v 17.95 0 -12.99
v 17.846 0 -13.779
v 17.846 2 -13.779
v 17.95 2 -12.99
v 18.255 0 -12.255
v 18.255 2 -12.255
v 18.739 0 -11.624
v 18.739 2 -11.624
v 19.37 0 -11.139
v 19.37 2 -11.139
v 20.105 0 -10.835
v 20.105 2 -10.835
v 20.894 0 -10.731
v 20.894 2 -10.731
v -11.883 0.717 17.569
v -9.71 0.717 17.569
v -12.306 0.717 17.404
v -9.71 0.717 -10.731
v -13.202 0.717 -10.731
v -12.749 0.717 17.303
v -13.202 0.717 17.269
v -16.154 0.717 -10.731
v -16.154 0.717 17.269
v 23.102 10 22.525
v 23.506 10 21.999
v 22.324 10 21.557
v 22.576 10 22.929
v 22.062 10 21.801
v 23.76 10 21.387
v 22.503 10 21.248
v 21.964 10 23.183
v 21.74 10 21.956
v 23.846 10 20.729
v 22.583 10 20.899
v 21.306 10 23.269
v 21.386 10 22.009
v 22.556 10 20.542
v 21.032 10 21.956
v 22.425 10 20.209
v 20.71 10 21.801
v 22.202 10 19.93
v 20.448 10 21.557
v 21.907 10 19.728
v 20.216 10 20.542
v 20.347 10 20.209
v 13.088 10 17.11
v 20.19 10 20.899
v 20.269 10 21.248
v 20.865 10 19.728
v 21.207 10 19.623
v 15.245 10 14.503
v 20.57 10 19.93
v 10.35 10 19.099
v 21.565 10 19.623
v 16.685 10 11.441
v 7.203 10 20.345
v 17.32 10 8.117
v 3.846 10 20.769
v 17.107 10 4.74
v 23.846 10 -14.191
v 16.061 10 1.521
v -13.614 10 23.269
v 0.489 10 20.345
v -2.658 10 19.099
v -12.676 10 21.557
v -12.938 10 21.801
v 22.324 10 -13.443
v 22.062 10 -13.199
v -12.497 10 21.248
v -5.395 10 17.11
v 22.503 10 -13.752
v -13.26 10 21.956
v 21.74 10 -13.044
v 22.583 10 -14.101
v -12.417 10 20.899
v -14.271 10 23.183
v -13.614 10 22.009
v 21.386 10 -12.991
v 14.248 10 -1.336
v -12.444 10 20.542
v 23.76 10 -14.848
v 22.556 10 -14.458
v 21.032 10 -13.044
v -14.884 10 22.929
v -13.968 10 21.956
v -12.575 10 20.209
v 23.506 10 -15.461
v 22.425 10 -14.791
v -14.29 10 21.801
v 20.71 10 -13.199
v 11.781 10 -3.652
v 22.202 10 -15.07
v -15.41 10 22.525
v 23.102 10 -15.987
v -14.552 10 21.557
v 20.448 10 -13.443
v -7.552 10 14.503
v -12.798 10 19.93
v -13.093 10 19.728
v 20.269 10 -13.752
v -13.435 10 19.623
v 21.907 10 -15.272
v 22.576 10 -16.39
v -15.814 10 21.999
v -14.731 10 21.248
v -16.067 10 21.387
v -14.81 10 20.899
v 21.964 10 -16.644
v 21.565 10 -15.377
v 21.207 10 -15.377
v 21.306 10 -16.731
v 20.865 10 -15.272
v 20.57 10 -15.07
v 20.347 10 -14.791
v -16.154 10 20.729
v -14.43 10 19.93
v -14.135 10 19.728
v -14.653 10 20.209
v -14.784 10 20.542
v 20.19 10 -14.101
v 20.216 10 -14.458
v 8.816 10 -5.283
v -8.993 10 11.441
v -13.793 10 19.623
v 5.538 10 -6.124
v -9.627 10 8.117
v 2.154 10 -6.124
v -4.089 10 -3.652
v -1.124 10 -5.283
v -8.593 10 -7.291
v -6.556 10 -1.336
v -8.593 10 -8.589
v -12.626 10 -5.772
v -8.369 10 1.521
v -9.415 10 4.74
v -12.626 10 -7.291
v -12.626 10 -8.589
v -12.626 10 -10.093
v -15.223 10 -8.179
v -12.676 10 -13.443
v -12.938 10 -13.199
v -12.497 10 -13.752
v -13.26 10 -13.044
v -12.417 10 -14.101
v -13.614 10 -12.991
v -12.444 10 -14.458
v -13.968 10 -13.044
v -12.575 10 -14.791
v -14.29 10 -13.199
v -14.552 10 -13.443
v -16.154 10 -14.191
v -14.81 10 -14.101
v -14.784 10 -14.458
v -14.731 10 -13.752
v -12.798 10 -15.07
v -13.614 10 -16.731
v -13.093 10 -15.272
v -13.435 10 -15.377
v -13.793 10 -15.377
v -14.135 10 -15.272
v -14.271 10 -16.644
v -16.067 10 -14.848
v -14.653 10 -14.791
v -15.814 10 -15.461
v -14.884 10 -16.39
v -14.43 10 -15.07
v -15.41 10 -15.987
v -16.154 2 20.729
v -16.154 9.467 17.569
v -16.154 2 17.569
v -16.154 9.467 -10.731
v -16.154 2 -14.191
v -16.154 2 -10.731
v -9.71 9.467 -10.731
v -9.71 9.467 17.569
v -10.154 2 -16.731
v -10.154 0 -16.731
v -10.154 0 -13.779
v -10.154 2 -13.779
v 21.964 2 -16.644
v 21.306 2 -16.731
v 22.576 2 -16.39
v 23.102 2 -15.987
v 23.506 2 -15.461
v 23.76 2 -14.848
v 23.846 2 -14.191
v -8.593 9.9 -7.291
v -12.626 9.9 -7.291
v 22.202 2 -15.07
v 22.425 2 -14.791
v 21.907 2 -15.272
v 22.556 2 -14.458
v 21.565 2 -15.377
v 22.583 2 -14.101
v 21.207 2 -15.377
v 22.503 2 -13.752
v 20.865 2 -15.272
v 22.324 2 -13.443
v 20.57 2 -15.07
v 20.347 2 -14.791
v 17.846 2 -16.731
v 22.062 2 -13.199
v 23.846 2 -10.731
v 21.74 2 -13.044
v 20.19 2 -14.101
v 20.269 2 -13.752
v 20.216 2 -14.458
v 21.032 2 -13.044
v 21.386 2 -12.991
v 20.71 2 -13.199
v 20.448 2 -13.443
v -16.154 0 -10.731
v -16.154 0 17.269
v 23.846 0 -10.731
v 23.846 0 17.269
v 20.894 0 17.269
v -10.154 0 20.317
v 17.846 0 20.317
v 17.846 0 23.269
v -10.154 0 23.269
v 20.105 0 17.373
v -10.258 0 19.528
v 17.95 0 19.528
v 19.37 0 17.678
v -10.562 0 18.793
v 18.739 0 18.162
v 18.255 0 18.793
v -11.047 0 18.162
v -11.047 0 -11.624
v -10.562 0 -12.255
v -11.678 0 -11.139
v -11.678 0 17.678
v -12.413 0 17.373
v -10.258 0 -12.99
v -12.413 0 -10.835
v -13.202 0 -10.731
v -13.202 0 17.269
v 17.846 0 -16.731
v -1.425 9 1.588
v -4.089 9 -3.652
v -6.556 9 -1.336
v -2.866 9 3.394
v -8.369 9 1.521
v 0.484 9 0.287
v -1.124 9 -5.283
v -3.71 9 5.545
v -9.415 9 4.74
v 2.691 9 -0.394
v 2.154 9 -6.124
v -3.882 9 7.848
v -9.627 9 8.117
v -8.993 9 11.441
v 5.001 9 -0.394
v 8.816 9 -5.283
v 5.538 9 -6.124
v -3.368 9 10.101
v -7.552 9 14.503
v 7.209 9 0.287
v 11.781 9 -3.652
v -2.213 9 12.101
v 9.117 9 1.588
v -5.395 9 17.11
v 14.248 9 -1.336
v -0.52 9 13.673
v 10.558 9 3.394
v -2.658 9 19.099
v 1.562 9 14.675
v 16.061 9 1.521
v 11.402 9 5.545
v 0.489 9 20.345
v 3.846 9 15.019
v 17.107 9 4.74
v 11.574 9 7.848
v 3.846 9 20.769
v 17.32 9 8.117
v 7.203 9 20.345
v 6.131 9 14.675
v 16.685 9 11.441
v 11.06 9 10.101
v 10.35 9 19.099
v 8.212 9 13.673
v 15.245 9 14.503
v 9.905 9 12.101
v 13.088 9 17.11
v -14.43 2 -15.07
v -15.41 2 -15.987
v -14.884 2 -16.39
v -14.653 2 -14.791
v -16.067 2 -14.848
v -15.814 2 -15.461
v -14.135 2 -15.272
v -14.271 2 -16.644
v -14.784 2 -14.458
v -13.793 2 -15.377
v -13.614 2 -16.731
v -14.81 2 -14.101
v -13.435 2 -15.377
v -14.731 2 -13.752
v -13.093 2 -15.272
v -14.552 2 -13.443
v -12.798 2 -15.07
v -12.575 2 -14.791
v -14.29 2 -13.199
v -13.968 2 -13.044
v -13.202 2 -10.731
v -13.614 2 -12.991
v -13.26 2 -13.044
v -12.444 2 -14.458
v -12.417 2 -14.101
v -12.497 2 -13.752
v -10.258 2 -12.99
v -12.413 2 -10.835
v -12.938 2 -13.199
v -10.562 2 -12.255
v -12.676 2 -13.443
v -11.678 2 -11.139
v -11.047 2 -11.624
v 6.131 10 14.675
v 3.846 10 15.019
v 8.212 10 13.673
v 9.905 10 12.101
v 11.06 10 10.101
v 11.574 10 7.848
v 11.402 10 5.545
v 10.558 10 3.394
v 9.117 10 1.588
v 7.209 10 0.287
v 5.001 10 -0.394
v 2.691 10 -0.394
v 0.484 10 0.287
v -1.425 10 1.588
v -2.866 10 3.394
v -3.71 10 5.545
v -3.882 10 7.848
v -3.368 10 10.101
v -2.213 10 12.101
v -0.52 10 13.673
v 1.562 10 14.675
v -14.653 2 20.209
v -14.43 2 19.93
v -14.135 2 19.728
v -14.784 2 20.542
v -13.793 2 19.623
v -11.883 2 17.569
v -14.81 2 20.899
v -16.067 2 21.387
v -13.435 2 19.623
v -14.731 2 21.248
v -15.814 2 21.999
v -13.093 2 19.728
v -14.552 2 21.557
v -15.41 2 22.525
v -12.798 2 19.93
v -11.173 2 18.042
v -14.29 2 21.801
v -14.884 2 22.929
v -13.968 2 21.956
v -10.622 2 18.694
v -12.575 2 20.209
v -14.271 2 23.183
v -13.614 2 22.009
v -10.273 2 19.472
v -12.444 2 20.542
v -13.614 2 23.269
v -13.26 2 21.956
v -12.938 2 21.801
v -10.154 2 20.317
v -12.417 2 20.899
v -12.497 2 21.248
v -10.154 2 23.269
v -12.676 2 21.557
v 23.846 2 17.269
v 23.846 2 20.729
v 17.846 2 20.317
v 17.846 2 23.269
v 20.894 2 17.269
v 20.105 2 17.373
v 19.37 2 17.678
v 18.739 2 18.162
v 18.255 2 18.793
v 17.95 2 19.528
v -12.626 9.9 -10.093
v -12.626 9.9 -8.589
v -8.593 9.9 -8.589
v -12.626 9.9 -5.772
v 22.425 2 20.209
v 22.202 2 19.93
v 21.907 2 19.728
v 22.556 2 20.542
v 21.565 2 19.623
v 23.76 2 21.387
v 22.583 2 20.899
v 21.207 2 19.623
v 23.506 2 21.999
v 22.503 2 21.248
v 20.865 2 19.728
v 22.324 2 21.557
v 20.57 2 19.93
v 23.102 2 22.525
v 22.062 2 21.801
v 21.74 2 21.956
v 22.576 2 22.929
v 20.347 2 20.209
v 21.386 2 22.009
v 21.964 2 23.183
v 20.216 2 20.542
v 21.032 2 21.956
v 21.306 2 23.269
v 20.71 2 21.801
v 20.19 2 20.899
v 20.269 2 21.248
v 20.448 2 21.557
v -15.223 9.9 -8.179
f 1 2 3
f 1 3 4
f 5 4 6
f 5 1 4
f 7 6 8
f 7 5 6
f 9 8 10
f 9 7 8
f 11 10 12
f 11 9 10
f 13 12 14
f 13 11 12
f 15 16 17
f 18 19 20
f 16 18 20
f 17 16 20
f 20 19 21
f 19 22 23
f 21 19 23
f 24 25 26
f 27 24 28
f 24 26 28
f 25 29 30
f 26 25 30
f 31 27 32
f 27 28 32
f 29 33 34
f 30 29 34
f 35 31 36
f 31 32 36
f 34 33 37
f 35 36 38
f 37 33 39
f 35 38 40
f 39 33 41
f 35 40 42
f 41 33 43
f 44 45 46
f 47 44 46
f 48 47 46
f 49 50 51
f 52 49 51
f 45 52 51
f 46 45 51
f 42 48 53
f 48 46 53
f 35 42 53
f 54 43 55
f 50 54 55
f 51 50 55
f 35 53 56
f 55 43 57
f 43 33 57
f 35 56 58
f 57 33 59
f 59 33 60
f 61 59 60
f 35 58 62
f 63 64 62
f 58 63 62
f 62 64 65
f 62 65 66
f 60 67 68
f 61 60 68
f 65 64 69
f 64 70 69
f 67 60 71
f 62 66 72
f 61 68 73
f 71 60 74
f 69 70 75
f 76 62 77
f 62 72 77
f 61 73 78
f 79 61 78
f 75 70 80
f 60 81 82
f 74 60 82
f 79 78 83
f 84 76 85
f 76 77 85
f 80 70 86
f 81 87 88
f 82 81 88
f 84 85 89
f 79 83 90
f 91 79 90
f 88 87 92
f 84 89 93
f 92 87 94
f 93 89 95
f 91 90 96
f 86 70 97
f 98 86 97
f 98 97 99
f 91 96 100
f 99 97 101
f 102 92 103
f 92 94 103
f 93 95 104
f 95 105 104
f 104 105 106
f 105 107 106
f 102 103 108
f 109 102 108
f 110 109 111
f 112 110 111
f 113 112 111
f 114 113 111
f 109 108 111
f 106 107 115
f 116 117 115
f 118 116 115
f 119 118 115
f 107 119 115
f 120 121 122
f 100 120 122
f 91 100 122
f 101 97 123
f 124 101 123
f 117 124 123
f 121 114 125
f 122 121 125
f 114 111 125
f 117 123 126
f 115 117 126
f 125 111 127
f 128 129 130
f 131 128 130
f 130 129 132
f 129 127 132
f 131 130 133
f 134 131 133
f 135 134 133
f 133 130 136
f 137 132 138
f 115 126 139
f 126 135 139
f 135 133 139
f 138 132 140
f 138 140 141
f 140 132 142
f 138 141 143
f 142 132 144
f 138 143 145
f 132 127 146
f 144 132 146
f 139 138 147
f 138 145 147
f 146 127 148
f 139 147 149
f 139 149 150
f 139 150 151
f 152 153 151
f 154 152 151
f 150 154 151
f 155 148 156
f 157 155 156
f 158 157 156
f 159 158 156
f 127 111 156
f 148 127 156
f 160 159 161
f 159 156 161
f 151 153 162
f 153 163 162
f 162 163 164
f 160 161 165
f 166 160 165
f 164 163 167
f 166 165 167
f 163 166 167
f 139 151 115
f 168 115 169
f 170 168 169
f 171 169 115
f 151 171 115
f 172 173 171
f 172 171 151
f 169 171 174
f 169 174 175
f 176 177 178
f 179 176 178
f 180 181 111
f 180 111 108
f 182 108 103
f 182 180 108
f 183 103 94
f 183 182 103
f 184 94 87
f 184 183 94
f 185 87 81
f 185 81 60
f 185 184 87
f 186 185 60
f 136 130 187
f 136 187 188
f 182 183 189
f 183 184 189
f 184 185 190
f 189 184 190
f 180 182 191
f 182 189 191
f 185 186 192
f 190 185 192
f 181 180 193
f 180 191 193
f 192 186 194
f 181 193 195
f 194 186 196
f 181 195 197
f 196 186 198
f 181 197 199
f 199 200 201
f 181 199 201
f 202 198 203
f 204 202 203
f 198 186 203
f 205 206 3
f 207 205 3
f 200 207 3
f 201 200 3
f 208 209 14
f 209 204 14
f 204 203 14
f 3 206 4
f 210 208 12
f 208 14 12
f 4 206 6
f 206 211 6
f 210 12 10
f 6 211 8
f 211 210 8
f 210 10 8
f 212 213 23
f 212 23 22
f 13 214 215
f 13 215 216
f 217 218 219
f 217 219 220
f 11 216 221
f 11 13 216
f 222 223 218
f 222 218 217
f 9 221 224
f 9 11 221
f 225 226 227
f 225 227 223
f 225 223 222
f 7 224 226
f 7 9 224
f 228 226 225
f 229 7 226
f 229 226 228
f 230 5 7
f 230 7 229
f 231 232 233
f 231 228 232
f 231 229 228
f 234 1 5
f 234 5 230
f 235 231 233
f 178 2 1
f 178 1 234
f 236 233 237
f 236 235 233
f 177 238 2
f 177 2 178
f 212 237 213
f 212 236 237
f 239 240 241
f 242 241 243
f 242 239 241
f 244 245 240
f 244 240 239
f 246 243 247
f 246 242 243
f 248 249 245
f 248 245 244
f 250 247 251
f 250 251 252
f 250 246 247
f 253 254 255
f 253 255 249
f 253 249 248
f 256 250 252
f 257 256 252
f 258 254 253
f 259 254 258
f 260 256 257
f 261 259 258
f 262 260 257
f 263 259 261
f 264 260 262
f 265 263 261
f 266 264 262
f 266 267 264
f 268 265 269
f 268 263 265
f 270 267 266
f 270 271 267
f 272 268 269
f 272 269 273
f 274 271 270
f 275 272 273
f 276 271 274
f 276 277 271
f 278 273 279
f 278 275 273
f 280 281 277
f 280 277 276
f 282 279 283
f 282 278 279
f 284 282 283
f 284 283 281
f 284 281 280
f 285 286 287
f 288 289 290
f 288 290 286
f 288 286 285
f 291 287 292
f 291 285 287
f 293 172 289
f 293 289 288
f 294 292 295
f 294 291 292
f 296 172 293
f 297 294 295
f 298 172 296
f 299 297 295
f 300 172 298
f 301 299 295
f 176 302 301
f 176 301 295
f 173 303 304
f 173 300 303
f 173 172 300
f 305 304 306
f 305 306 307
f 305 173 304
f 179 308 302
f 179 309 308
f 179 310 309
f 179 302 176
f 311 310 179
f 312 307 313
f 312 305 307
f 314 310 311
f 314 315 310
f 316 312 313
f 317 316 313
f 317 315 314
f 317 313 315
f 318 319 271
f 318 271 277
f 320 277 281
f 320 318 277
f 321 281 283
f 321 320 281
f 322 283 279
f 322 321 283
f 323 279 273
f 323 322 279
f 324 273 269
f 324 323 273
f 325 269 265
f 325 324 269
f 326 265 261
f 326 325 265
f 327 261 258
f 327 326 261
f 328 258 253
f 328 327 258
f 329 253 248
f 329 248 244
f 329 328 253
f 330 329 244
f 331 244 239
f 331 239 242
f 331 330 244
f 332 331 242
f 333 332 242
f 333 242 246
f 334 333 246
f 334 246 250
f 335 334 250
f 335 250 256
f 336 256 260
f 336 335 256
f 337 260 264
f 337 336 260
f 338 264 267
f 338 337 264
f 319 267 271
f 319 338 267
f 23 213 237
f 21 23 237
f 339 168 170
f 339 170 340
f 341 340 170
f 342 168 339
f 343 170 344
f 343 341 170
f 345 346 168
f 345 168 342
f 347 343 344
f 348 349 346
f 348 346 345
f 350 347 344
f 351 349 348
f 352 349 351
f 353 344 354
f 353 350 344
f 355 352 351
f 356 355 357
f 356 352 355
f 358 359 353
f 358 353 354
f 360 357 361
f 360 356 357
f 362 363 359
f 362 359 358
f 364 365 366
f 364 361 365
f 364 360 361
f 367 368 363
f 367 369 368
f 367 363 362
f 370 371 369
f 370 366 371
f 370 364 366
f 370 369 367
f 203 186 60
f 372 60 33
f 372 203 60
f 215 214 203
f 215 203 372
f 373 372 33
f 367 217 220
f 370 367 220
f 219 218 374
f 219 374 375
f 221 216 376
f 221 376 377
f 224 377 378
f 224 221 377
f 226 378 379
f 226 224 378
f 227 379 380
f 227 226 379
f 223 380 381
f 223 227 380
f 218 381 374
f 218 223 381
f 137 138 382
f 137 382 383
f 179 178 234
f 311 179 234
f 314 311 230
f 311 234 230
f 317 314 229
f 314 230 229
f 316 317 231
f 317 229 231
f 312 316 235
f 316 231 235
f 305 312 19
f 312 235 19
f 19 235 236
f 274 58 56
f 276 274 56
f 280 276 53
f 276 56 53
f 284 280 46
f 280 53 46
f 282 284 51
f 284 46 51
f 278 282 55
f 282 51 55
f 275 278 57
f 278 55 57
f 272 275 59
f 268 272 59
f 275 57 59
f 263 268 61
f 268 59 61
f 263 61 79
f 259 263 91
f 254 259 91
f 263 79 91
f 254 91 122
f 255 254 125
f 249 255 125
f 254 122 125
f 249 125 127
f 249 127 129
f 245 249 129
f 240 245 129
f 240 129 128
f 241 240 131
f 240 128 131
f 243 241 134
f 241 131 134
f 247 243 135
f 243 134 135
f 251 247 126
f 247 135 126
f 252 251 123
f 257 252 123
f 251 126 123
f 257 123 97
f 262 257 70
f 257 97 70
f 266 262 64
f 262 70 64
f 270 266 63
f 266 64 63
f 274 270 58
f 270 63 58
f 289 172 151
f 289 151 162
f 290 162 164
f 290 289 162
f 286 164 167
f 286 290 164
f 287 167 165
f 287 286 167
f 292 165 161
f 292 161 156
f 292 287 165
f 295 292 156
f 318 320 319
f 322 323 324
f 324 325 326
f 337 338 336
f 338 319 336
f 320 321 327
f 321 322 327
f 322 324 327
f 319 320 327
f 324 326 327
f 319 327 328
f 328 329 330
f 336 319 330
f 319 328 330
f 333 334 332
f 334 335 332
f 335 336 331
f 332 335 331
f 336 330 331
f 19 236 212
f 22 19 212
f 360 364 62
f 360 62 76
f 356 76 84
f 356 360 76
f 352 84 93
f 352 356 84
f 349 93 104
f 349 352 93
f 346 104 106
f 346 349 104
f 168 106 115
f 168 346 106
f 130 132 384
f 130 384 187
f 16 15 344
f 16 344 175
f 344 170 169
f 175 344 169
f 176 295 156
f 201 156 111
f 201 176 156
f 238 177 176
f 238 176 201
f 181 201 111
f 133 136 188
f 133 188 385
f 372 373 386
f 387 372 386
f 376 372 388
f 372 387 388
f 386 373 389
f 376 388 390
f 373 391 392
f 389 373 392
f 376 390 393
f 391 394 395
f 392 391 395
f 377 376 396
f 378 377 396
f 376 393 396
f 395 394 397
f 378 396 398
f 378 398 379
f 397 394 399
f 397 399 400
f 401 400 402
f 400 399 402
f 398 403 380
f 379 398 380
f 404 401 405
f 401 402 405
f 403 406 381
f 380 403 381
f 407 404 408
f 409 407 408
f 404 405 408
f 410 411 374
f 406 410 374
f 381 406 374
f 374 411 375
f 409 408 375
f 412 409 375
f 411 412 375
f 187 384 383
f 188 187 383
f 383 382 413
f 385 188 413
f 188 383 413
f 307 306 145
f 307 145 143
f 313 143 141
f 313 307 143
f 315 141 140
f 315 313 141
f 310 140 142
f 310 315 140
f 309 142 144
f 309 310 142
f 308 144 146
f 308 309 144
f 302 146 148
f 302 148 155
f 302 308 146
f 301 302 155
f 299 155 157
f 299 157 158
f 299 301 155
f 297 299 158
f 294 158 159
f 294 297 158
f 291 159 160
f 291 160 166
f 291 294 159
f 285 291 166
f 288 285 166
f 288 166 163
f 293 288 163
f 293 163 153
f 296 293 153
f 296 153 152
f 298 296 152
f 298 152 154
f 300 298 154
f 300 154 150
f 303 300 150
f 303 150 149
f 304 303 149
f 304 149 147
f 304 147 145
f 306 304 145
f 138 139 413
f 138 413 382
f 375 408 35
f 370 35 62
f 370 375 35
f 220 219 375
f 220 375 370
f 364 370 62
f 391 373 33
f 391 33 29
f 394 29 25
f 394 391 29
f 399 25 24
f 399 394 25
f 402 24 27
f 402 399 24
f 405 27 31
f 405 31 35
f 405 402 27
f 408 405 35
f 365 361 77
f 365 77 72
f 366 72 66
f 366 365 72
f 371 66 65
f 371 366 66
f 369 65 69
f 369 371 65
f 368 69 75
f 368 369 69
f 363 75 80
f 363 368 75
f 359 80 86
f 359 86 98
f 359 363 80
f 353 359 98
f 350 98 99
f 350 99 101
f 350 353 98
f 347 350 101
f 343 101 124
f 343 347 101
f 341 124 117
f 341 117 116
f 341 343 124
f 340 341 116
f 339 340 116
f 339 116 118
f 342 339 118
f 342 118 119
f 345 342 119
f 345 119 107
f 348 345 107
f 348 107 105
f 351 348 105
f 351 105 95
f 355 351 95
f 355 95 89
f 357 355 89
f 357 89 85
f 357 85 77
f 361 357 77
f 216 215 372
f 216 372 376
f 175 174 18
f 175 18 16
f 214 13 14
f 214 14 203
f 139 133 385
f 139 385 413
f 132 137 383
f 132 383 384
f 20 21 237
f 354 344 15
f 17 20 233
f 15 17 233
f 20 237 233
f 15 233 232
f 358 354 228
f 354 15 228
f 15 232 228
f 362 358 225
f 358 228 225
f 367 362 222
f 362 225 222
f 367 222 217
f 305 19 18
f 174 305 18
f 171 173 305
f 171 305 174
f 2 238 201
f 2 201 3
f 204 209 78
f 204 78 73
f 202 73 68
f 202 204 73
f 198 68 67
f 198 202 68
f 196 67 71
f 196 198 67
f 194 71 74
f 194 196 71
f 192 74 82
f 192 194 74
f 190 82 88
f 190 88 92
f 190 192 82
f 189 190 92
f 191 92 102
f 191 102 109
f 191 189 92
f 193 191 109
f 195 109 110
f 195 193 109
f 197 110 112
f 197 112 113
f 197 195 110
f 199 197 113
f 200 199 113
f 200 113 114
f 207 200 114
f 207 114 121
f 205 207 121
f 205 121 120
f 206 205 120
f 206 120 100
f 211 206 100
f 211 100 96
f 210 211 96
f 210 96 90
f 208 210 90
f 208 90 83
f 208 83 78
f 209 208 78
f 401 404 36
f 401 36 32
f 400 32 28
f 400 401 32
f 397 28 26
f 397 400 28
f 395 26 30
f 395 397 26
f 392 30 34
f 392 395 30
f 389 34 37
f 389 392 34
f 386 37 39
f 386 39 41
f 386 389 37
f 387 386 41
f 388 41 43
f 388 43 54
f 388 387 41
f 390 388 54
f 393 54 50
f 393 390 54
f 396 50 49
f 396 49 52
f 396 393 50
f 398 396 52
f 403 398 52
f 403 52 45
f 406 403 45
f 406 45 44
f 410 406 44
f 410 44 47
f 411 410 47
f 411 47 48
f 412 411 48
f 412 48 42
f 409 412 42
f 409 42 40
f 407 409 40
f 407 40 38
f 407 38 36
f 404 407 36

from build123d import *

# Parameters (mm, degrees)
SKETCH1_R           = 1.2
BOSS_EXTRUDE1_DEPTH = 10
SKETCH3_R           = 13.5
SKETCH3_R_2         = 7.75
CUT_EXTRUDE1_DEPTH  = 1
SKETCH4_W           = 28.3
SKETCH4_H           = 8.75
CUT_EXTRUDE2_DEPTH  = 6.444
CUT_EXTRUDE3_DEPTH  = 0.1
CUT_EXTRUDE4_DEPTH  = 2


with BuildPart() as part:
    # Sketch1 → Boss-Extrude1 (new body)
    with BuildSketch(Plane(origin=(0, 0, 0), x_dir=(1, 0, 0), z_dir=(0, 1, 0))):
        with BuildLine():
            Line((-13.613846154, 16.730769231), (21.306153846, 16.730769231))
            ThreePointArc((21.306153846, 16.730769231), (23.10220507, 15.986820455), (23.846153846, 14.190769231))
            Line((23.846153846, 14.190769231), (23.846153846, -20.729230769))
            ThreePointArc((23.846153846, -20.729230769), (23.10220507, -22.525281993), (21.306153846, -23.269230769))
            Line((21.306153846, -23.269230769), (-13.613846154, -23.269230769))
            ThreePointArc((-13.613846154, -23.269230769), (-15.409897378, -22.525281993), (-16.153846154, -20.729230769))
            Line((-16.153846154, -20.729230769), (-16.153846154, 14.190769231))
            ThreePointArc((-16.153846154, 14.190769231), (-15.409897378, 15.986820455), (-13.613846154, 16.730769231))
        make_face()
        with Locations(Location((-13.613846154, 14.190769231, 0), (0, 0, 270))):
            Circle(SKETCH1_R, mode=Mode.SUBTRACT)
        with Locations(Location((21.386153846, 14.190769231, 0), (0, 0, 270))):
            Circle(SKETCH1_R, mode=Mode.SUBTRACT)
        with Locations(Location((21.386153846, -20.809230769, 0), (0, 0, 270))):
            Circle(SKETCH1_R, mode=Mode.SUBTRACT)
        with Locations(Location((-13.613846154, -20.809230769, 0), (0, 0, 270))):
            Circle(SKETCH1_R, mode=Mode.SUBTRACT)
    extrude(amount=BOSS_EXTRUDE1_DEPTH)

    # Sketch3 → Cut-Extrude1 (cut)
    with BuildSketch(Plane(origin=(0, 10, 0), x_dir=(1, 0, 0), z_dir=(0, 1, 0))):
        with Locations(Location((3.846153846, -7.269230769, 0), (0, 0, 270))):
            Circle(SKETCH3_R)
        with Locations(Location((3.846153846, -7.269230769, 0), (0, 0, 270))):
            Circle(SKETCH3_R_2, mode=Mode.SUBTRACT)
    extrude(amount=-CUT_EXTRUDE1_DEPTH, mode=Mode.SUBTRACT)

    # Sketch4 → Cut-Extrude2 (cut)
    with BuildSketch(Plane.ZY.offset(16.153846154)):
        with Locations((3.419230769, 5.092214042)):
            Rectangle(SKETCH4_W, SKETCH4_H)
    extrude(amount=-CUT_EXTRUDE2_DEPTH, mode=Mode.SUBTRACT)

    # Sketch5 → Cut-Extrude3 (cut)
    with BuildSketch(Plane(origin=(0, 10, 0), x_dir=(1, 0, 0), z_dir=(0, 1, 0))):
        Polygon((-12.625840765, 10.092905938), (-12.625840765, 8.58923838), (-8.593277769, 8.58923838), (-8.593277769, 7.290616398), (-12.625840765, 7.290616398), (-12.625840765, 5.771945506), (-15.223084728, 8.179147228), align=None)
    extrude(amount=-CUT_EXTRUDE3_DEPTH, mode=Mode.SUBTRACT)

    # Sketch6 → Cut-Extrude4 (cut)
    with BuildSketch(Plane.XZ):
        with BuildLine():
            Line((-16.153846154, 17.269230769), (-13.201846154, 17.269230769))
            ThreePointArc((-13.201846154, 17.269230769), (-11.046584685, 18.1619693), (-10.153846154, 20.317230769))
            Line((-10.153846154, 20.317230769), (-10.153846154, 23.269230769))
            Line((-10.153846154, 23.269230769), (-10.153846154, 27.06129419))
            Line((-10.153846154, 27.06129419), (-21.305262053, 27.06129419))
            Line((-21.305262053, 27.06129419), (-21.305262053, 17.269230769))
            Line((-21.305262053, 17.269230769), (-16.153846154, 17.269230769))
        make_face()
        with BuildLine():
            Line((23.846153846, 17.269230769), (20.894153846, 17.269230769))
            ThreePointArc((20.894153846, 17.269230769), (18.738892377, 18.1619693), (17.846153846, 20.317230769))
            Line((17.846153846, 20.317230769), (17.846153846, 23.269230769))
            Line((17.846153846, 23.269230769), (17.846153846, 27.06129419))
            Line((17.846153846, 27.06129419), (26.668789671, 27.06129419))
            Line((26.668789671, 27.06129419), (26.668789671, 17.269230769))
            Line((26.668789671, 17.269230769), (23.846153846, 17.269230769))
        make_face()
        with BuildLine():
            Line((-10.153846154, -16.730769231), (-10.153846154, -13.778769231))
            ThreePointArc((-10.153846154, -13.778769231), (-11.046584685, -11.623507762), (-13.201846154, -10.730769231))
            Line((-13.201846154, -10.730769231), (-16.153846154, -10.730769231))
            Line((-16.153846154, -10.730769231), (-21.305262053, -10.730769231))
            Line((-21.305262053, -10.730769231), (-21.305262053, -18.817505275))
            Line((-21.305262053, -18.817505275), (-10.153846154, -18.817505275))
            Line((-10.153846154, -18.817505275), (-10.153846154, -16.730769231))
        make_face()
        with BuildLine():
            Line((17.846153846, -16.730769231), (17.846153846, -13.778769231))
            ThreePointArc((17.846153846, -13.778769231), (18.738892377, -11.623507762), (20.894153846, -10.730769231))
            Line((20.894153846, -10.730769231), (23.846153846, -10.730769231))
            Line((23.846153846, -10.730769231), (26.668789671, -10.730769231))
            Line((26.668789671, -10.730769231), (26.668789671, -18.817505275))
            Line((26.668789671, -18.817505275), (17.846153846, -18.817505275))
            Line((17.846153846, -18.817505275), (17.846153846, -16.730769231))
        make_face()
    extrude(amount=-CUT_EXTRUDE4_DEPTH, mode=Mode.SUBTRACT)


solid = part.part
